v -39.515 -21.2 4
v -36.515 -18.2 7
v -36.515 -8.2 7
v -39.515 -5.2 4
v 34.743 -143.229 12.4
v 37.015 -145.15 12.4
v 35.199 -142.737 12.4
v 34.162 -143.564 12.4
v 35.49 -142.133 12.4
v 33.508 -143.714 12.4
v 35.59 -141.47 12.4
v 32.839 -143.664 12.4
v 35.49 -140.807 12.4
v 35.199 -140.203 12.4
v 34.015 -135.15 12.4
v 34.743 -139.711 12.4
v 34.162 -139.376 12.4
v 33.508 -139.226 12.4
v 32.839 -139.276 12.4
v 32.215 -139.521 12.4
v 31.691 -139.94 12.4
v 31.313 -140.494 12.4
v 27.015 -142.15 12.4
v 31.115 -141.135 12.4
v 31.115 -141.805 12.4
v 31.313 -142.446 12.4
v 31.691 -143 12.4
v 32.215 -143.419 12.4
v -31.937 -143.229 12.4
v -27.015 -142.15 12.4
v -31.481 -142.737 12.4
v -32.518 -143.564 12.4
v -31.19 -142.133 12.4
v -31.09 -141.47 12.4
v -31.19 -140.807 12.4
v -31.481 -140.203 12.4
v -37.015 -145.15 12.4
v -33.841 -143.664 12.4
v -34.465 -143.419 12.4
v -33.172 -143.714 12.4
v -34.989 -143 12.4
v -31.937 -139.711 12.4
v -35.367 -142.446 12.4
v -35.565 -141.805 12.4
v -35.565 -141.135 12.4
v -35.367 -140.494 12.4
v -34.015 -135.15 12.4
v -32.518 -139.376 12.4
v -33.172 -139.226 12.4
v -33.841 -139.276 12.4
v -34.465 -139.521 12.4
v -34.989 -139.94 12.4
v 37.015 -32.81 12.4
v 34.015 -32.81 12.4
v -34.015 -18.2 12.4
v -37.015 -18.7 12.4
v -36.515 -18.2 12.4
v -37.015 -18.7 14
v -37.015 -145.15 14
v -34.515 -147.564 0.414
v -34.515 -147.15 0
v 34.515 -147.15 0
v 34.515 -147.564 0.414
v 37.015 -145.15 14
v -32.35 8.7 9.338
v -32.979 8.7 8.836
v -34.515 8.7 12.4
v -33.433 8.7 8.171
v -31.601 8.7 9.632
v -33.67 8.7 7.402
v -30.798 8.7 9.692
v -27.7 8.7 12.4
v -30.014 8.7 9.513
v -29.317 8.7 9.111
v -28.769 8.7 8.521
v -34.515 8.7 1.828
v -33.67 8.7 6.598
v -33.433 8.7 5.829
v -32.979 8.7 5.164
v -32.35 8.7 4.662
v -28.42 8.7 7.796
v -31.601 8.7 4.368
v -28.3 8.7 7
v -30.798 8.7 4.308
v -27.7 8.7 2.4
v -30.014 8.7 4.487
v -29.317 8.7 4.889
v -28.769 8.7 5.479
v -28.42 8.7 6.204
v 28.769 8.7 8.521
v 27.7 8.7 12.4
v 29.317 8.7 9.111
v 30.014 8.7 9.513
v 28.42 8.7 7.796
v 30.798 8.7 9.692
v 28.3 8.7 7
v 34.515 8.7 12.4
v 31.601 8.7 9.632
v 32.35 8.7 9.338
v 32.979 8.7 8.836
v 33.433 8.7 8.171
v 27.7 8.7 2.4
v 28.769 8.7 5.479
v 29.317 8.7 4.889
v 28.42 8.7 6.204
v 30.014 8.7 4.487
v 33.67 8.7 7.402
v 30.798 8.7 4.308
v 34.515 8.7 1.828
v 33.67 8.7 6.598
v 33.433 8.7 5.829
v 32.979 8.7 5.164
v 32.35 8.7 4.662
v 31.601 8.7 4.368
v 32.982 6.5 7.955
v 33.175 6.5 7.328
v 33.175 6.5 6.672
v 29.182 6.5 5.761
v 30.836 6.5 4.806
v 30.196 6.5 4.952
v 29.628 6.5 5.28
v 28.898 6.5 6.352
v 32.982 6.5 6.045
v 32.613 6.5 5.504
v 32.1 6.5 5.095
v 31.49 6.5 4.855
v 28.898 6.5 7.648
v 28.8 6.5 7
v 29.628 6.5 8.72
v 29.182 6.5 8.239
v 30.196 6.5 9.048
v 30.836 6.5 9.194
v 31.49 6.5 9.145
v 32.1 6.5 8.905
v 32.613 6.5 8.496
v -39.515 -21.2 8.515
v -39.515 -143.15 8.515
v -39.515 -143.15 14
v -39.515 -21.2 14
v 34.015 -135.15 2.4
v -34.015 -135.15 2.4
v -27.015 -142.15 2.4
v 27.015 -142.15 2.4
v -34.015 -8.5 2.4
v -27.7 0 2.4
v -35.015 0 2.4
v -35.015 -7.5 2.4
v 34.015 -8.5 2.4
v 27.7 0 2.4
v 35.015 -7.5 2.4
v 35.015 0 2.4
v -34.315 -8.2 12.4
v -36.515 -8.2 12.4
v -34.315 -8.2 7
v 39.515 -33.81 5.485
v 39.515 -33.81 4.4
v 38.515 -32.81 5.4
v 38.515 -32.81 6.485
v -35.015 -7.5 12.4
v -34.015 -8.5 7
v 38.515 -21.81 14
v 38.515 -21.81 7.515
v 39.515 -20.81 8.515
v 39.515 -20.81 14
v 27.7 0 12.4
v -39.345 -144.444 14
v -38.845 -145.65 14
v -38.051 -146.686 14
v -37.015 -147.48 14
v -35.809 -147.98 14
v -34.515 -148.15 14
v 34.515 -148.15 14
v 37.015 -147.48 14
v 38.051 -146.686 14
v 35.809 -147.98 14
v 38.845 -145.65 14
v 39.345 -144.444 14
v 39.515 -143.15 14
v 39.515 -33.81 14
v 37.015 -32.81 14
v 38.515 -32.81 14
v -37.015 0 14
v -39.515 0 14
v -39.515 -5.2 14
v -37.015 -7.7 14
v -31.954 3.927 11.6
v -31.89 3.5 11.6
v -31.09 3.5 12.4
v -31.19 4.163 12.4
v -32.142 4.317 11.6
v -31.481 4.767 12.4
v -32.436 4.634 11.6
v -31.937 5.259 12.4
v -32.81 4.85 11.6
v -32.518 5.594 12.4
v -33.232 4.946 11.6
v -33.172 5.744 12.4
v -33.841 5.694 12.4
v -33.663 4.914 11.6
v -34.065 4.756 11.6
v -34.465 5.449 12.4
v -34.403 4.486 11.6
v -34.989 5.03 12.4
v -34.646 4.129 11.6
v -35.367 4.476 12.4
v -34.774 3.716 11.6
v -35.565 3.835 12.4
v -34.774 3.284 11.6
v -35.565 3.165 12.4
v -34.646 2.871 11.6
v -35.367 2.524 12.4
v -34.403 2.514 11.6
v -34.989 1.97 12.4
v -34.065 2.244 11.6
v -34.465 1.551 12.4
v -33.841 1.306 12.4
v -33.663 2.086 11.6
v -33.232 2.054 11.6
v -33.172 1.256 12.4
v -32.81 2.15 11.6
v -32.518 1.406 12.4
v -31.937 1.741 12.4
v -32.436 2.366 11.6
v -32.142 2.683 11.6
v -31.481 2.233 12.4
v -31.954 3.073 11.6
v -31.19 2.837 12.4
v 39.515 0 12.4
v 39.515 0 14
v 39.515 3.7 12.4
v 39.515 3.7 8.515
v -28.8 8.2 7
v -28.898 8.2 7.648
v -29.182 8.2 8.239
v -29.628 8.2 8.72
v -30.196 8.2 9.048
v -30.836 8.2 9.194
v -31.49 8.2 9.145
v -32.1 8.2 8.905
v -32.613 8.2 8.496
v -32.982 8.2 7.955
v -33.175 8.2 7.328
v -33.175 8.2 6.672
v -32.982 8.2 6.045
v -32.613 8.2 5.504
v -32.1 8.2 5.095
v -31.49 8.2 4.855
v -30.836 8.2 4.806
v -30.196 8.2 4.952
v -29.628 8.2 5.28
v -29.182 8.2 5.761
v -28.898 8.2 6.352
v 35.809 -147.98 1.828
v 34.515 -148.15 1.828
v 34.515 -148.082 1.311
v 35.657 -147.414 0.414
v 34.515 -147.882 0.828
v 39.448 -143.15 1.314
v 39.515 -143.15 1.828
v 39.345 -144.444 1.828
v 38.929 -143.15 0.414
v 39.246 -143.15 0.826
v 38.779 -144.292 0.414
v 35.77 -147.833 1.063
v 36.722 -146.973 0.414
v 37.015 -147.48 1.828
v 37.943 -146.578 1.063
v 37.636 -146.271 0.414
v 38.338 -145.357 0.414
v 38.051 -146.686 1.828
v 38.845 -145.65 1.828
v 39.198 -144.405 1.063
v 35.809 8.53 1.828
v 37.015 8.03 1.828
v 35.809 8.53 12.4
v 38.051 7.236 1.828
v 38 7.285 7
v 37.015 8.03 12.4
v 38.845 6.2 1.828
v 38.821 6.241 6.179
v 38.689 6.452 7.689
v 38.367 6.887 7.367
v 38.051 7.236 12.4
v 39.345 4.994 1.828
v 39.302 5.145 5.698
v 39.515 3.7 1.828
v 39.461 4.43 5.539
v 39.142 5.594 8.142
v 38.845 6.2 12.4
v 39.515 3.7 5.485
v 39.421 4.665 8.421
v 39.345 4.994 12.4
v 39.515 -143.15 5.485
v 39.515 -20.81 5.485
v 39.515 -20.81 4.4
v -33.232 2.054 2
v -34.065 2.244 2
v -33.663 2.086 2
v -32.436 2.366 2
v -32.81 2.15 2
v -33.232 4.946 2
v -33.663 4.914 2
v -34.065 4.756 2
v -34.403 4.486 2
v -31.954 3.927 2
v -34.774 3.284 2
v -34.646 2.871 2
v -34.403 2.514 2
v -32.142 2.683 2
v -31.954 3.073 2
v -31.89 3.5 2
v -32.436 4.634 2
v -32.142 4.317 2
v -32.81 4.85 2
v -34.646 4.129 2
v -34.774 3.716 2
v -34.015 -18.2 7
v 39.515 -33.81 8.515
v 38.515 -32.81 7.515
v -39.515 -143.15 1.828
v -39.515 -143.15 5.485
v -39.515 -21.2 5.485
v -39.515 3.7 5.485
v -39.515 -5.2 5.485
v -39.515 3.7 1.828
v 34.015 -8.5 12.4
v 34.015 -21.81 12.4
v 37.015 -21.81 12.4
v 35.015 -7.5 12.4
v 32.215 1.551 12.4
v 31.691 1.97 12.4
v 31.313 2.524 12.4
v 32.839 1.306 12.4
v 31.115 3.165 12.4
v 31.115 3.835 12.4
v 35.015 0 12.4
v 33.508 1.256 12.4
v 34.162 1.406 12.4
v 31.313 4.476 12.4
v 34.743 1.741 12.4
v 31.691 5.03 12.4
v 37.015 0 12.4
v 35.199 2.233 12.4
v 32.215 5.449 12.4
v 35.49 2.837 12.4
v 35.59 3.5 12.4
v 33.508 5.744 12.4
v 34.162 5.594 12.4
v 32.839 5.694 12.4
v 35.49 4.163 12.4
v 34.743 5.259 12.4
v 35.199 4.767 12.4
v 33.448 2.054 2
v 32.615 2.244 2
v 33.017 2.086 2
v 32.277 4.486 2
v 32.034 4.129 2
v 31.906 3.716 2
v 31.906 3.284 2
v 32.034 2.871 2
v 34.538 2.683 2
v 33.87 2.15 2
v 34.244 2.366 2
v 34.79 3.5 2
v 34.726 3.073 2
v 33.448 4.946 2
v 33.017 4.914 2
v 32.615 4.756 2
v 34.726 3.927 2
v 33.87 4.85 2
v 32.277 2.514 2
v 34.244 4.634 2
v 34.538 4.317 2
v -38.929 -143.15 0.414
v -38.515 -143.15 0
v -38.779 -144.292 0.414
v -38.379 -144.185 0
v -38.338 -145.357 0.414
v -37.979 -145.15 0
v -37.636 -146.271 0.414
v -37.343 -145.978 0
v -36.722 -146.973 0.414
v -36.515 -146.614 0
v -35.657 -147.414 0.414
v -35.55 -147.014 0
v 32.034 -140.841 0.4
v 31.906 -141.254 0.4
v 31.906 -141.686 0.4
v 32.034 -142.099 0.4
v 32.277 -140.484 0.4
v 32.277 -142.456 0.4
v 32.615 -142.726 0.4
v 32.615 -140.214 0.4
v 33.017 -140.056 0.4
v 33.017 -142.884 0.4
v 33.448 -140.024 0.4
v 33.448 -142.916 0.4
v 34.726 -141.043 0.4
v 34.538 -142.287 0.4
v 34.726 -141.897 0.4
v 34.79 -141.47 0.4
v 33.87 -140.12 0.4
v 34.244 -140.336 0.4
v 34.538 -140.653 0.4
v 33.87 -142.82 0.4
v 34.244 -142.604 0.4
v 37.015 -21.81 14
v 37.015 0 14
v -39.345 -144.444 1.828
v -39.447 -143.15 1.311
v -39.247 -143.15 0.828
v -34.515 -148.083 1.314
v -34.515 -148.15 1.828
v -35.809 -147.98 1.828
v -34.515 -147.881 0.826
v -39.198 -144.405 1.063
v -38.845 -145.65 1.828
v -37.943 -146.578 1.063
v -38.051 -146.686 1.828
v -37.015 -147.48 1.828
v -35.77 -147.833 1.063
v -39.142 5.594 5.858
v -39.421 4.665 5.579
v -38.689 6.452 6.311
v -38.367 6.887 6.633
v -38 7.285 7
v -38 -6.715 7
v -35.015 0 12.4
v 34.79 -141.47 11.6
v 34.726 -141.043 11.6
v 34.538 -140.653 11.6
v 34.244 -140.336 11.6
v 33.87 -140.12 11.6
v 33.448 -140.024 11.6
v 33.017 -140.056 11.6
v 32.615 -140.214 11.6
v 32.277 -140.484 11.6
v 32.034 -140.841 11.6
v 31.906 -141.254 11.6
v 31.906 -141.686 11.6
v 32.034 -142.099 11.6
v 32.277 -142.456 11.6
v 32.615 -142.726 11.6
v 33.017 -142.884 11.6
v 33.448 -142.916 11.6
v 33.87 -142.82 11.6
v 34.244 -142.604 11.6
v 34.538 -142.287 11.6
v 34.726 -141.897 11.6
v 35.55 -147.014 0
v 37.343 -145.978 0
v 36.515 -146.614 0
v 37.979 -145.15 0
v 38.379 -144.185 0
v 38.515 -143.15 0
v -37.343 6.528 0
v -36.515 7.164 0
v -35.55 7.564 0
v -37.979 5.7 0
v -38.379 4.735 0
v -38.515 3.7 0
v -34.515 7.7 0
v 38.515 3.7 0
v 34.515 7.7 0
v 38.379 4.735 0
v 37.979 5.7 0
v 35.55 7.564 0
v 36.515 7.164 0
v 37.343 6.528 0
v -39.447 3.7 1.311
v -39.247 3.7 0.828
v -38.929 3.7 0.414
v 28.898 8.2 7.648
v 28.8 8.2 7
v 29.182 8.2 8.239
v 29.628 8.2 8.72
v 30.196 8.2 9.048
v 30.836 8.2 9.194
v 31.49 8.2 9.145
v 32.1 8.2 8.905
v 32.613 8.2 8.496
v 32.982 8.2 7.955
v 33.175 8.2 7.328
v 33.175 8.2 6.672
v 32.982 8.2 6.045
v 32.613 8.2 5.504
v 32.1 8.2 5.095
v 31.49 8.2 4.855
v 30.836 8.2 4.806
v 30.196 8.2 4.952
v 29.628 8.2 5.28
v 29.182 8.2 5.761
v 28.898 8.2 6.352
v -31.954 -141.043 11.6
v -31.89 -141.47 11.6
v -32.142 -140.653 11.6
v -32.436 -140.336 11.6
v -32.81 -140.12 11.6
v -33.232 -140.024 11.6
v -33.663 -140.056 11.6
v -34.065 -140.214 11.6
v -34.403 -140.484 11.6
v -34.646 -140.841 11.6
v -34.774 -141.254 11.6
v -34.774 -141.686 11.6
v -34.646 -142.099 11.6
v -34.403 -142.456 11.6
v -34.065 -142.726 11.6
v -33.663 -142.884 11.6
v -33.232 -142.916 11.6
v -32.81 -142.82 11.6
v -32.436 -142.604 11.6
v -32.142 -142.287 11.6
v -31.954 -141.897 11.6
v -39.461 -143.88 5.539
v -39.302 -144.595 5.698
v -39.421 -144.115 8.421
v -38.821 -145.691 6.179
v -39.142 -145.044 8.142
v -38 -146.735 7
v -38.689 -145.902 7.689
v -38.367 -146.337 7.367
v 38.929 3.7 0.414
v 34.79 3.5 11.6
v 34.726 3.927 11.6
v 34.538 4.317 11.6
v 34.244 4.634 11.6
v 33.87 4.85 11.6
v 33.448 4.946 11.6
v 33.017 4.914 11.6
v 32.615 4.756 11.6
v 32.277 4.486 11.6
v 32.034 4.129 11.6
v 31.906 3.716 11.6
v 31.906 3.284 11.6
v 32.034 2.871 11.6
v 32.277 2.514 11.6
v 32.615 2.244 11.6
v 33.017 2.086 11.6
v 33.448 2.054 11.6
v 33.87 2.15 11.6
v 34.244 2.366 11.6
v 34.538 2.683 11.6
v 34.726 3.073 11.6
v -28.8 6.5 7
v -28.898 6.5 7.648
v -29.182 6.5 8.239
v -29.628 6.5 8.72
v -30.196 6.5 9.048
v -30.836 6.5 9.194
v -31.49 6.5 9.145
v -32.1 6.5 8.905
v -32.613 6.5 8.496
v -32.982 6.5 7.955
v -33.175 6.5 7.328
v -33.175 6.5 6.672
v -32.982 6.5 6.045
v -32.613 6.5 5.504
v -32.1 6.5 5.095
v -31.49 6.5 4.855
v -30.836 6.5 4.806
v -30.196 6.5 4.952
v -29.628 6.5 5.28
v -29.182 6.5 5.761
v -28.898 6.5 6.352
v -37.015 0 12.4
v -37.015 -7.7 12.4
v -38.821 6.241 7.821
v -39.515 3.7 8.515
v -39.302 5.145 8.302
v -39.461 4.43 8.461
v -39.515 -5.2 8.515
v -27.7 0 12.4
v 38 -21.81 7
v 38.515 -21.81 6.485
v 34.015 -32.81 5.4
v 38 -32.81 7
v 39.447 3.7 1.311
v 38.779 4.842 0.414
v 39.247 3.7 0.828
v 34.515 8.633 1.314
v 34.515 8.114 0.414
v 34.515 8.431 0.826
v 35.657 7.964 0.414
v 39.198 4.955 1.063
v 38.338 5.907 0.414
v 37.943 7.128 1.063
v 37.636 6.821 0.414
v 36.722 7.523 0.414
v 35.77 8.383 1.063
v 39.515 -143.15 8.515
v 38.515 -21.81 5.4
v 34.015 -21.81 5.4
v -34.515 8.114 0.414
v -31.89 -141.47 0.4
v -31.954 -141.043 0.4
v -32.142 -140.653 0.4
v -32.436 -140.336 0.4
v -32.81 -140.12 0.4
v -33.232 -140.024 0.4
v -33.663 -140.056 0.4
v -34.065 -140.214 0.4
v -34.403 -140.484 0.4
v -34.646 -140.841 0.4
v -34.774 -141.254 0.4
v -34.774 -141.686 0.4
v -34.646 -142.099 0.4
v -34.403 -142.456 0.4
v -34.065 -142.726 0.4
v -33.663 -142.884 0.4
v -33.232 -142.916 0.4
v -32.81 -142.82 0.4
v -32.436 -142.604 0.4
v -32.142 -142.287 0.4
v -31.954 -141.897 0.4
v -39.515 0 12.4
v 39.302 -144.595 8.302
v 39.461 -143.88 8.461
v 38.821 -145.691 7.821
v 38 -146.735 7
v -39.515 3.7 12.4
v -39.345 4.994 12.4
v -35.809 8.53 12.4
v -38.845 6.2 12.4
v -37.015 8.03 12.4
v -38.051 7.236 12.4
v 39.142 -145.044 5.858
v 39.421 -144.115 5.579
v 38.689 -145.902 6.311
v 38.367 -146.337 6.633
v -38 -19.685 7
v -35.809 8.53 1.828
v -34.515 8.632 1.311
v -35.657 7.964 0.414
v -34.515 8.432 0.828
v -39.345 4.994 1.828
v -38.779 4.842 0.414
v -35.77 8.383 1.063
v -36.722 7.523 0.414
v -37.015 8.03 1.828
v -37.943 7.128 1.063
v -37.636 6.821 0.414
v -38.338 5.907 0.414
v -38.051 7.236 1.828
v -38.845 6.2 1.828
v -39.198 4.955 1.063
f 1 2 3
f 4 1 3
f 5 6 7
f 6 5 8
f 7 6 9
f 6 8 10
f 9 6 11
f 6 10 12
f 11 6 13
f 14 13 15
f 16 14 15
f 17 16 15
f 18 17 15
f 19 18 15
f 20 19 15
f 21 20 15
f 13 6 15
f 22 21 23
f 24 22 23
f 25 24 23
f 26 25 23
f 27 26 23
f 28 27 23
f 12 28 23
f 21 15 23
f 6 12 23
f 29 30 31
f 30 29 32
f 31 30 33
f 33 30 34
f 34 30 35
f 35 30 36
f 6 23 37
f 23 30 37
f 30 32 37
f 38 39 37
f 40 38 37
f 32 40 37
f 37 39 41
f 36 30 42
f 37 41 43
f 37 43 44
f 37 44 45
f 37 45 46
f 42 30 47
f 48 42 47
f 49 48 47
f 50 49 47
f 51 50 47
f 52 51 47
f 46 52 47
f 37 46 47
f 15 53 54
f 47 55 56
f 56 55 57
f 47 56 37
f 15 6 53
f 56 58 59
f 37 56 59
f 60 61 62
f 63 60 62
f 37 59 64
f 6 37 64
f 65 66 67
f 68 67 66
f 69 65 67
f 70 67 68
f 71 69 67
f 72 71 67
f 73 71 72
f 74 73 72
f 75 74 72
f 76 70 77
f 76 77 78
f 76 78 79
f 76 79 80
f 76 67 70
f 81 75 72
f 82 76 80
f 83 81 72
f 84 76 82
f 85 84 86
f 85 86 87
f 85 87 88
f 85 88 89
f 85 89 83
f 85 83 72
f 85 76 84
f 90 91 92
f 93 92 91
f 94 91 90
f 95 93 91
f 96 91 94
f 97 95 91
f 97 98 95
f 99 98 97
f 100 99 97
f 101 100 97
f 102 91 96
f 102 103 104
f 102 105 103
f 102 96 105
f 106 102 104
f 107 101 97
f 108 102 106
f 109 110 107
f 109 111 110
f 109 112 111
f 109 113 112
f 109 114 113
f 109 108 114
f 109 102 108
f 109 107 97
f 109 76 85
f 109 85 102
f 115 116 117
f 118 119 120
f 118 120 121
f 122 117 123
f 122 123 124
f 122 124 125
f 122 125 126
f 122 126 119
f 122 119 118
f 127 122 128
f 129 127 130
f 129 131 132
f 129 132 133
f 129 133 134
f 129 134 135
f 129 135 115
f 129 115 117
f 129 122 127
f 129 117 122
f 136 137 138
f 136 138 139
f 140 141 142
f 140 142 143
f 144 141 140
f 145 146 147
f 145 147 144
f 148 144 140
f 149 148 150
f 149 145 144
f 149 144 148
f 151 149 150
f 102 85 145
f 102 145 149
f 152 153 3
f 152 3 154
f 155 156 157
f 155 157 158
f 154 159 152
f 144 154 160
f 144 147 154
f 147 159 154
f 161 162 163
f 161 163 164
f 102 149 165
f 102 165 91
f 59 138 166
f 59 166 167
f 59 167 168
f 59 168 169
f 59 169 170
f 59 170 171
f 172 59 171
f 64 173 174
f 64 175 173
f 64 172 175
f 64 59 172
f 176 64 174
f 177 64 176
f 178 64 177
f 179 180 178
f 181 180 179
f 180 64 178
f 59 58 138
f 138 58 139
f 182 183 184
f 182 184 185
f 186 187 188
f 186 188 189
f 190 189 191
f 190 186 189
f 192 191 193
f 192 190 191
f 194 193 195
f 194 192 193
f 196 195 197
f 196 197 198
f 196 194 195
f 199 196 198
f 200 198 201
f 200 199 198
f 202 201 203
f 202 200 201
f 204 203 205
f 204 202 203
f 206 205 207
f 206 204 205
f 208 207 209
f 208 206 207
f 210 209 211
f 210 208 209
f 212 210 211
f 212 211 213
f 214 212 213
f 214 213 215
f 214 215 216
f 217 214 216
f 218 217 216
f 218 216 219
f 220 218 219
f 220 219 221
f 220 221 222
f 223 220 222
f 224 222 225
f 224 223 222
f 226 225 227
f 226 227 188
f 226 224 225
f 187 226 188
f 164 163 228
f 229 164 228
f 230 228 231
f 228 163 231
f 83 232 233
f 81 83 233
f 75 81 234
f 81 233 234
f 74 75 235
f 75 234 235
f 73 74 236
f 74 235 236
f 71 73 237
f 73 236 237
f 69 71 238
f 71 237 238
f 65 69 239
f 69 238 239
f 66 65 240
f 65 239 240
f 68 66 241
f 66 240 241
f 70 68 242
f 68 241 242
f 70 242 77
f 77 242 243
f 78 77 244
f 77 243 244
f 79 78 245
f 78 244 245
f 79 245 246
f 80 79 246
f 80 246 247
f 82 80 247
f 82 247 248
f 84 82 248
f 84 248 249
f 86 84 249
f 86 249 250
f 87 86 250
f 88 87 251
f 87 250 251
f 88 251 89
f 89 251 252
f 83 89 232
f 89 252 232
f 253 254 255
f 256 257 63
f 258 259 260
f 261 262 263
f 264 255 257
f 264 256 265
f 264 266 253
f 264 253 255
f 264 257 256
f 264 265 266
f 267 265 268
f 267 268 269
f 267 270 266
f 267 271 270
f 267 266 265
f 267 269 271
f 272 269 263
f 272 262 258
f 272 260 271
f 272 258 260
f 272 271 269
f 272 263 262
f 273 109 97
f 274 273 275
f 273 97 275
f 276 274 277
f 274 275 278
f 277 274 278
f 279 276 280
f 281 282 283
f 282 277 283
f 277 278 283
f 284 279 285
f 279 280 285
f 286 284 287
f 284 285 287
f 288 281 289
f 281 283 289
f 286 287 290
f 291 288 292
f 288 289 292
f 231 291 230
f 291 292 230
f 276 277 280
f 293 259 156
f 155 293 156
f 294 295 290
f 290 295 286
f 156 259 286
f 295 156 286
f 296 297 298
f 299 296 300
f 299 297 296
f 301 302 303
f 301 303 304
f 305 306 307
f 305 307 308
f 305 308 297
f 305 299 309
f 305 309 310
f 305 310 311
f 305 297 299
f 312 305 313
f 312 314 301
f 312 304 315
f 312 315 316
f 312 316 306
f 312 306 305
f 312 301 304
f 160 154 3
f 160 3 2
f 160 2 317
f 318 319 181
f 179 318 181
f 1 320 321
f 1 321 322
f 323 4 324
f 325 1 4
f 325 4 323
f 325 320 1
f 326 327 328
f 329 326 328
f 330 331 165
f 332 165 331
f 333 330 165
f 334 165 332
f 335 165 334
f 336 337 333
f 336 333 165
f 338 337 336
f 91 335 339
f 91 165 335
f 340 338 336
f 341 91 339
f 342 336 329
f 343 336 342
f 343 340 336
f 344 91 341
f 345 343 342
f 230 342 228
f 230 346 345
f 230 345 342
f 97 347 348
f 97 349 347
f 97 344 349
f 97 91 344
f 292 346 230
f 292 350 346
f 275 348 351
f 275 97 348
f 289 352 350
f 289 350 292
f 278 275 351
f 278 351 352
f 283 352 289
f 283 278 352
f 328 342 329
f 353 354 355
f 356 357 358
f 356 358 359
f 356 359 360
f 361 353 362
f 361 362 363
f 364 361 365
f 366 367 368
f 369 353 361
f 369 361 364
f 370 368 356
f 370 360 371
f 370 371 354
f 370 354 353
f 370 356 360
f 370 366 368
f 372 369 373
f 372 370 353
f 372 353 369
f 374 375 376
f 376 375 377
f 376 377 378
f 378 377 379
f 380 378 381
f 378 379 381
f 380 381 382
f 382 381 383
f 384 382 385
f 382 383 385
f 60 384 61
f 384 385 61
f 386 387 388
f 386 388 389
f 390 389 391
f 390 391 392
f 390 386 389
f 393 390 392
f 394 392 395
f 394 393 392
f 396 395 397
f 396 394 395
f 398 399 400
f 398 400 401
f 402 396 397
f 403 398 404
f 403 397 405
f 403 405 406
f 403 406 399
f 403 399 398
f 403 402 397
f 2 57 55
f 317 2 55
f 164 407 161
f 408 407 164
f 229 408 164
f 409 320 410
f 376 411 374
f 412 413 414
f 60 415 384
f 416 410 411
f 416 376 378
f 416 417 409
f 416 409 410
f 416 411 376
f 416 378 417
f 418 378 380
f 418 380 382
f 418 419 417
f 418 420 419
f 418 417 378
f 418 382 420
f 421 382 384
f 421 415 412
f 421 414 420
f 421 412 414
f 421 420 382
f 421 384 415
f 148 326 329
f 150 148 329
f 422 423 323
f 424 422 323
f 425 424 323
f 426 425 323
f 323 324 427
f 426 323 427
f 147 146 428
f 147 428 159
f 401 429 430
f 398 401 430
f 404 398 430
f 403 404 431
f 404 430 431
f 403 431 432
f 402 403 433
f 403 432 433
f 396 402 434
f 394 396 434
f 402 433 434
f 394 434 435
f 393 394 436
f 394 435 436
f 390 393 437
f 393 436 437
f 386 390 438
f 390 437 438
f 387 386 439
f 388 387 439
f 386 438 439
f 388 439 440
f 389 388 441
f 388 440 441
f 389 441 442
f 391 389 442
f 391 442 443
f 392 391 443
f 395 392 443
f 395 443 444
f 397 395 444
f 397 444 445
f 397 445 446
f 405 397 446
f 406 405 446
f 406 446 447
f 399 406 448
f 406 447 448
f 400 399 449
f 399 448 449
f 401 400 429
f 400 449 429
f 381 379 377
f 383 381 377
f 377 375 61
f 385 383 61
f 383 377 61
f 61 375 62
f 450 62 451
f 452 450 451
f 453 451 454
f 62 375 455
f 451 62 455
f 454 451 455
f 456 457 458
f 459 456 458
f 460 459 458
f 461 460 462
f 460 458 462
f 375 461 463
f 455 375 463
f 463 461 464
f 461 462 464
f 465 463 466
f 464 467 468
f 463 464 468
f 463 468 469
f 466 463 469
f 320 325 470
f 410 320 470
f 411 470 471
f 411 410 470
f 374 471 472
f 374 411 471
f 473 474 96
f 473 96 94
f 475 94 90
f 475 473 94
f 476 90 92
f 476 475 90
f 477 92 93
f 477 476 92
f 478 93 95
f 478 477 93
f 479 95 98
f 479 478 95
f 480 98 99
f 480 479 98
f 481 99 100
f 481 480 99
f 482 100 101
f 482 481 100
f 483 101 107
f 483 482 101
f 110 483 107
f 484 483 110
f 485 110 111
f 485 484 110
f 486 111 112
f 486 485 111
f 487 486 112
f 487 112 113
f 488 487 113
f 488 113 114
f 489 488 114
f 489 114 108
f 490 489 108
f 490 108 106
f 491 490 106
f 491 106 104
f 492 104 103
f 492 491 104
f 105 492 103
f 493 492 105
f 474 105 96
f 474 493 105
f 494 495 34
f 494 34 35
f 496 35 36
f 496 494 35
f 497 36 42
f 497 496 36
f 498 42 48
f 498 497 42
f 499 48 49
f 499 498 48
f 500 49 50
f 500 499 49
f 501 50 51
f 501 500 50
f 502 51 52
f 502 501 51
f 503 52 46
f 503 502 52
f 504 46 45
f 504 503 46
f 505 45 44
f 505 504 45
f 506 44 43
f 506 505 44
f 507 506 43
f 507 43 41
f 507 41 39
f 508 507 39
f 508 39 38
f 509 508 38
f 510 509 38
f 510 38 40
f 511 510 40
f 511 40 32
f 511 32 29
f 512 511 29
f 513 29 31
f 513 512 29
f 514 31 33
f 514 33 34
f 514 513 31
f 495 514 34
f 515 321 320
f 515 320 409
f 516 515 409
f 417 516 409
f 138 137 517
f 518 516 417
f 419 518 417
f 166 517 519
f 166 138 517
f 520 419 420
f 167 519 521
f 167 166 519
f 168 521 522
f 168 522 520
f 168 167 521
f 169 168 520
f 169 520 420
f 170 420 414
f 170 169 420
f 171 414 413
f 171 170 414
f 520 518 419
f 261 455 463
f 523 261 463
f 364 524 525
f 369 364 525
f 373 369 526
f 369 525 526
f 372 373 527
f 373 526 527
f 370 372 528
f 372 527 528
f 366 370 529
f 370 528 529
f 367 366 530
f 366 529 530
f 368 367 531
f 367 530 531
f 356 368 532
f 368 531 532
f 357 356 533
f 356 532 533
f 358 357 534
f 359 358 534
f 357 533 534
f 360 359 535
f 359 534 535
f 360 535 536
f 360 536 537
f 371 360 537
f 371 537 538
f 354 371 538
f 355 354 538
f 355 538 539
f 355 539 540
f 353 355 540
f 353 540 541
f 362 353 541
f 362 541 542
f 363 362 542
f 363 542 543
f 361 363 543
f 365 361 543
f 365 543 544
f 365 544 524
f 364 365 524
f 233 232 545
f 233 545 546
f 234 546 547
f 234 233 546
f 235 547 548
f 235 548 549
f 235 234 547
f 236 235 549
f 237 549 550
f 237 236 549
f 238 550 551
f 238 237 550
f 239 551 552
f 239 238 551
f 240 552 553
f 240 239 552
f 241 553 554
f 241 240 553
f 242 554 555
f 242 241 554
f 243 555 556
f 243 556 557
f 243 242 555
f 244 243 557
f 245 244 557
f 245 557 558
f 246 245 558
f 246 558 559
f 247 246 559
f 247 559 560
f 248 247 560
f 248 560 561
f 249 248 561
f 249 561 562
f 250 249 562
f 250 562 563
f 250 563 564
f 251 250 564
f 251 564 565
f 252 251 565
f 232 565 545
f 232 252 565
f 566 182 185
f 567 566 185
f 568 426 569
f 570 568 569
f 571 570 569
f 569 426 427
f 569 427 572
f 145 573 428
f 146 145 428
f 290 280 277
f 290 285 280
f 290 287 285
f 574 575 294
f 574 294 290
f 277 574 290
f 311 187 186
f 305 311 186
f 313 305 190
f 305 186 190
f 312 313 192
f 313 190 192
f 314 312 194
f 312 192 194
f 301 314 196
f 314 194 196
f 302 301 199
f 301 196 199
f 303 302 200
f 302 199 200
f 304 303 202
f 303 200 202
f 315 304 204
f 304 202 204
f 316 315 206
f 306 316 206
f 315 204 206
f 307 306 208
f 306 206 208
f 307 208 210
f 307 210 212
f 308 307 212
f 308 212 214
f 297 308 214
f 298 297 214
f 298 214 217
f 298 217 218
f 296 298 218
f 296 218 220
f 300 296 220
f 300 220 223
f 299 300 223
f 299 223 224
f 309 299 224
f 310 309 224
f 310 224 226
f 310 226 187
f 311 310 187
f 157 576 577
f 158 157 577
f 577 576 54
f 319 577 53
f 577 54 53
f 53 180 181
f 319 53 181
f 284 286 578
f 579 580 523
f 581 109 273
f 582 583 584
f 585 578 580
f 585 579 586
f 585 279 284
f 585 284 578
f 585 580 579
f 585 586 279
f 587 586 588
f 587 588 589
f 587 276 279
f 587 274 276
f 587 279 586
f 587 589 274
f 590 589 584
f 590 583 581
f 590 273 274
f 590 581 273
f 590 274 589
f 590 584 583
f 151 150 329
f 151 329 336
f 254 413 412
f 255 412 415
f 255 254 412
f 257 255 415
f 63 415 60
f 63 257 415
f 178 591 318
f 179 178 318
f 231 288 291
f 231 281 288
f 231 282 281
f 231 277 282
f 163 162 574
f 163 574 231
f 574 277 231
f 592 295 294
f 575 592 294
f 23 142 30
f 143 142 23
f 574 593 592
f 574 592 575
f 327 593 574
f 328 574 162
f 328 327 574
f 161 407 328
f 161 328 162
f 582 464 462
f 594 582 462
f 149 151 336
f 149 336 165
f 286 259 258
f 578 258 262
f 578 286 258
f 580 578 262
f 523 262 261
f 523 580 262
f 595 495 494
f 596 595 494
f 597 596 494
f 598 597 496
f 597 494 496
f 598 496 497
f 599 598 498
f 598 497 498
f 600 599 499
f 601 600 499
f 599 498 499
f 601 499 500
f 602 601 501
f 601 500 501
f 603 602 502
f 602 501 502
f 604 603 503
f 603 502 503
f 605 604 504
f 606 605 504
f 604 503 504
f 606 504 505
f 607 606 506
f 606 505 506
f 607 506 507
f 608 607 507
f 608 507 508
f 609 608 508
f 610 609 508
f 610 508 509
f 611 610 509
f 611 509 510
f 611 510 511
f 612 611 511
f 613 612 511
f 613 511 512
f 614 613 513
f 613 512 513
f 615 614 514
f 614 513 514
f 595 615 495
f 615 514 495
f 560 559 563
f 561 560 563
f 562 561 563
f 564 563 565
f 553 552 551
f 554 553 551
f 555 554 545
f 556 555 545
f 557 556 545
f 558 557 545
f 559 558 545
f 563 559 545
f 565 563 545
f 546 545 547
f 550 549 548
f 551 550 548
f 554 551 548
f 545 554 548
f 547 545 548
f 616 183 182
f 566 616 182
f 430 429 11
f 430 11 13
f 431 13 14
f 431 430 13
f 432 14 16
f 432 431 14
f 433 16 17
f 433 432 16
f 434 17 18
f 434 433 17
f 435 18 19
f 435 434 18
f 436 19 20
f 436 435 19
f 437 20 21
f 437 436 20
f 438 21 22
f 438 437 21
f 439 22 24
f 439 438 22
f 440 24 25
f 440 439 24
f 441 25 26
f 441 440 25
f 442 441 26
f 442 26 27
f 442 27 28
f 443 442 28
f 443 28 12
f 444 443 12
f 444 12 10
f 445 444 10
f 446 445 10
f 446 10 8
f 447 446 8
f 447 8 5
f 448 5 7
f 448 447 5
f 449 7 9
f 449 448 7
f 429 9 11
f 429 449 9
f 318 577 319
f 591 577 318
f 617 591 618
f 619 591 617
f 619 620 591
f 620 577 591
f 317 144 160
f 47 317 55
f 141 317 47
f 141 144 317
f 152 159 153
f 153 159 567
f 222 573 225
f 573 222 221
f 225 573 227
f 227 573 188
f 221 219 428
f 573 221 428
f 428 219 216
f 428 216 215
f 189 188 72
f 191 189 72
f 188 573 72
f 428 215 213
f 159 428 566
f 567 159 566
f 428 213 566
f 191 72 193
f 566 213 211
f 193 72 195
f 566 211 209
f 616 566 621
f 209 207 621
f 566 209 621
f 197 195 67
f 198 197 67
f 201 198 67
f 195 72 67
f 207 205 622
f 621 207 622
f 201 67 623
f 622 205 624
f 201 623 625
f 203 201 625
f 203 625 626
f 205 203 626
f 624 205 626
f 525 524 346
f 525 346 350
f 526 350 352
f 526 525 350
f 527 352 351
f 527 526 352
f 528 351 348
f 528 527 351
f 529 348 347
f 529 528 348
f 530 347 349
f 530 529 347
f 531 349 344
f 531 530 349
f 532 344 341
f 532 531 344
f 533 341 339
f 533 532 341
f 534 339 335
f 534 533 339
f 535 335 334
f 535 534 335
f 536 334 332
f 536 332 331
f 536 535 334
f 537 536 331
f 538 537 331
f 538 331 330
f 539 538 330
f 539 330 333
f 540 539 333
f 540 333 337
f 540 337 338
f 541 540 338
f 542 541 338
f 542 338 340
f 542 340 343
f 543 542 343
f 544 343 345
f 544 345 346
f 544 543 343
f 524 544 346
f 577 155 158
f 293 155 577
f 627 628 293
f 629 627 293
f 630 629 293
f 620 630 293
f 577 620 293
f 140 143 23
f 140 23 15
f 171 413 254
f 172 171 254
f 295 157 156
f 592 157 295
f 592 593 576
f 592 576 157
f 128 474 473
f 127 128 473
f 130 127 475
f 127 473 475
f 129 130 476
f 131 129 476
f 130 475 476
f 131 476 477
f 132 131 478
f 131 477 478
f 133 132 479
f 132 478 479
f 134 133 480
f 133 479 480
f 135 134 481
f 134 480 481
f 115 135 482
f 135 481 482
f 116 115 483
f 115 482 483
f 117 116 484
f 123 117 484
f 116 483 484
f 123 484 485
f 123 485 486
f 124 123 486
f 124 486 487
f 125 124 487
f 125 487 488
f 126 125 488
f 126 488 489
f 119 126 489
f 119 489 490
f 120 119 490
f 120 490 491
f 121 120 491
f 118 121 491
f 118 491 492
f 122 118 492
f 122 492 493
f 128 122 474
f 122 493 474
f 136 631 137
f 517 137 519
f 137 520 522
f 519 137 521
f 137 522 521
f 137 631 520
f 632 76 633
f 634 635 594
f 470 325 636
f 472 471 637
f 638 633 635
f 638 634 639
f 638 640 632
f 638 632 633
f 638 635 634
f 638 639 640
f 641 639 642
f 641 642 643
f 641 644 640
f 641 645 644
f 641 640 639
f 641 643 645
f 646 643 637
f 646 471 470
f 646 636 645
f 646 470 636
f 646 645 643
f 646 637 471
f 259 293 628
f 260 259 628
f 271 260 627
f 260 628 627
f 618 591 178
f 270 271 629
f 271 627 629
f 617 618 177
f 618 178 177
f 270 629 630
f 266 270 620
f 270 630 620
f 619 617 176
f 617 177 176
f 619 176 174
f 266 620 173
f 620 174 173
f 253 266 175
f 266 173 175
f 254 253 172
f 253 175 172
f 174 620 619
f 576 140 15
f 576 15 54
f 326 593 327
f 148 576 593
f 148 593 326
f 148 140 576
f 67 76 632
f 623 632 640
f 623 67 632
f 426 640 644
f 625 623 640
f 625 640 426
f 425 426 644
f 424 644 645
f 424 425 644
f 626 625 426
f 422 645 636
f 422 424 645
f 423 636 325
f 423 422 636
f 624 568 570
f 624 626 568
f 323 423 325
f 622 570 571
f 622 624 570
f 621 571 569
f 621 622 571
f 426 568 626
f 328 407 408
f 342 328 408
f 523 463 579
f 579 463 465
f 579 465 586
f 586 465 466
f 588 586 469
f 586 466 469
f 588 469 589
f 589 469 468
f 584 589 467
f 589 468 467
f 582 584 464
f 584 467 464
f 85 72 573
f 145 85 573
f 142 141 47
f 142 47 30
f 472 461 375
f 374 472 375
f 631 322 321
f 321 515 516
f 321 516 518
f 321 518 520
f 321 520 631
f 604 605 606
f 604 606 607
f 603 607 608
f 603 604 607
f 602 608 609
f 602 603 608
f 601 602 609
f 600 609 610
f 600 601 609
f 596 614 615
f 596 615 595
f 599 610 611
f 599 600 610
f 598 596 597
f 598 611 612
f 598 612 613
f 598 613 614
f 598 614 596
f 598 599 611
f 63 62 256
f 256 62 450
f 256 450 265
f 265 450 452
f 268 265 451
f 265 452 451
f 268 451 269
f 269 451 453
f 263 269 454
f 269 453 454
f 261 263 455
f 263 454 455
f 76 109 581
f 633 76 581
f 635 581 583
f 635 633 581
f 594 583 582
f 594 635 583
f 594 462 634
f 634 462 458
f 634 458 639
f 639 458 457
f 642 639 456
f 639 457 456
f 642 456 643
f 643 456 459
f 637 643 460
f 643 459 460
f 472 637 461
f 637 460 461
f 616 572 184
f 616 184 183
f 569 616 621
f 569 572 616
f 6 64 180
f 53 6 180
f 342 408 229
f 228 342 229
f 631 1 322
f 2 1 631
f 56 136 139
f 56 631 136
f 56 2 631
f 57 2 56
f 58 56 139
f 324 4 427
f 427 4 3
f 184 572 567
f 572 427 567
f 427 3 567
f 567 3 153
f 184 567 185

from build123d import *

# Parameters (mm, degrees)
SKETCH_W        = 79.03
SKETCH_H        = 156.85
PAD_DEPTH       = 14
POCKET_DEPTH    = 11.6
PAD001_DEPTH    = 10
SKETCH003_R     = 1.45
POCKET001_DEPTH = 12
FILLET_R        = 5
CHAMFER_SIZE    = 1
FILLET001_R     = 2
CHAMFER001_SIZE = 0.8
SKETCH004_W     = 12.65
SKETCH004_H     = 11
POCKET002_DEPTH = 8.6
SKETCH005_W     = 11.08
SKETCH005_H     = 10
POCKET003_DEPTH = 7
SKETCH006_R     = 1.45
POCKET004_DEPTH = 12
SKETCH007_W     = 92.15
SKETCH007_H     = 16.7
POCKET005_DEPTH = 1.6
CHAMFER002_SIZE = 0.8
CHAMFER003_SIZE = 3
CHAMFER004_SIZE = 1
POCKET006_DEPTH = 509.235242
SKETCH009_R     = 2.2
POCKET007_DEPTH = 2.2
CHAMFER005_SIZE = 0.5


with BuildPart() as part:
    # Sketch → Pad (new body)
    with BuildSketch(Plane.XY):
        with Locations((0, -69.725)):
            Rectangle(SKETCH_W, SKETCH_H)
    extrude(amount=PAD_DEPTH)

    # Sketch001 (on Face6 of Pad) → Pocket (cut)
    with BuildSketch(Plane.XY.offset(14)):
        Polygon((-37.015, -145.15), (37.015, -145.15), (37.015, 0), (27.7, 0), (27.7, 8.7), (-27.7, 8.7), (-27.7, 0), (-37.015, 0), align=None)
    extrude(amount=-POCKET_DEPTH, mode=Mode.SUBTRACT)

    # Sketch002 (on Face6 of Pocket) → Pad001 (join)
    with BuildSketch(Plane.XY.offset(2.4)):
        Polygon((-35.015, 0), (-35.015, -7.5), (-34.015, -8.5), (-34.015, -135.15), (-27.015, -142.15), (27.015, -142.15), (34.015, -135.15), (34.015, -8.5), (35.015, -7.5), (35.015, 0), (37.015, 0), (37.015, -145.15), (-37.015, -145.15), (-37.015, 0), align=None)
    extrude(amount=PAD001_DEPTH)

    # Sketch003 (on Face24 of Pad001) → Pocket001 (cut)
    with BuildSketch(Plane.XY.offset(12.4)):
        with Locations((-33.34, -141.47)):
            Circle(SKETCH003_R)
        with Locations((33.34, -141.47)):
            Circle(SKETCH003_R)
    extrude(amount=-POCKET001_DEPTH, mode=Mode.SUBTRACT)

    # Fillet
    fillet_edges = [part.edges().sort_by_distance(p)[0] for p in [
        (39.515, 8.7, 7),
        (39.515, -148.15, 7),
        (-39.515, 8.7, 7),
        (-39.515, -148.15, 7),
    ]]
    fillet(fillet_edges, radius=FILLET_R)

    # Chamfer
    chamfer_edges = [part.edges().sort_by_distance(p)[0] for p in [
        (-38.050534, 7.235534, 0),
    ]]
    chamfer(chamfer_edges, length=CHAMFER_SIZE)

    # Fillet001
    fillet001_edges = [part.edges().sort_by_distance(p)[0] for p in [
        (-38.050534, 7.235534, 1),
    ]]
    fillet(fillet001_edges, radius=FILLET001_R)

    # Chamfer001
    chamfer001_edges = [part.edges().sort_by_distance(p)[0] for p in [
        (-34.79, -141.47, 12.4),
        (31.89, -141.47, 12.4),
    ]]
    chamfer(chamfer001_edges, length=CHAMFER001_SIZE)

    # Sketch004 (on Face20 of Chamfer001) → Pocket002 (cut)
    with BuildSketch(Plane.XY.offset(14)):
        with Locations((37.485, -27.31)):
            Rectangle(SKETCH004_W, SKETCH004_H)
    extrude(amount=-POCKET002_DEPTH, mode=Mode.SUBTRACT)

    # Sketch005 (on Face16 of Pocket002) → Pocket003 (cut)
    with BuildSketch(Plane.XY.offset(14)):
        with Locations((-36.33, -13.2)):
            Rectangle(SKETCH005_W, SKETCH005_H)
    extrude(amount=-POCKET003_DEPTH, mode=Mode.SUBTRACT)

    # Sketch006 → Pocket004 (cut)
    with BuildSketch(Plane.XY.offset(14)):
        with Locations((-33.34, 3.5)):
            Circle(SKETCH006_R)
        with Locations((33.34, 3.5)):
            Circle(SKETCH006_R)
    extrude(amount=-POCKET004_DEPTH, mode=Mode.SUBTRACT)

    # Sketch007 (on Face7 of Pocket004) → Pocket005 (cut)
    with BuildSketch(Plane.XY.offset(14)):
        with Locations((0, 8.35)):
            Rectangle(SKETCH007_W, SKETCH007_H)
    extrude(amount=-POCKET005_DEPTH, mode=Mode.SUBTRACT)

    # Chamfer002
    chamfer002_edges = [part.edges().sort_by_distance(p)[0] for p in [
        (31.89, 3.5, 12.4),
        (-34.79, 3.5, 12.4),
    ]]
    chamfer(chamfer002_edges, length=CHAMFER002_SIZE)

    # Chamfer003
    chamfer003_edges = [part.edges().sort_by_distance(p)[0] for p in [
        (-39.515, -8.2, 10.5),
        (-39.515, -13.2, 7),
        (-39.515, -18.2, 10.5),
    ]]
    chamfer(chamfer003_edges, length=CHAMFER003_SIZE)

    # Chamfer004
    chamfer004_edges = [part.edges().sort_by_distance(p)[0] for p in [
        (39.515, -21.81, 9.7),
        (39.515, -27.31, 5.4),
        (39.515, -32.81, 9.7),
    ]]
    chamfer(chamfer004_edges, length=CHAMFER004_SIZE)

    # Sketch008 (on Face9 of Chamfer004) → Pocket006 (cut, through all)
    with BuildSketch(Plane.XZ.offset(148.15)):
        Polygon((-43, 12), (-43, 2), (-38, 7), align=None)
    pocket006 = extrude(amount=-POCKET006_DEPTH, mode=Mode.SUBTRACT)

    # Mirrored: Pocket006 across Sketch008 V_Axis
    add(pocket006.mirror(Plane(origin=(0, -148.15, 0), x_dir=(0, -1, 0), z_dir=(1, 0, 0))), mode=Mode.SUBTRACT)

    # Sketch009 (on Face56 of Mirrored) → Pocket007 (cut)
    with BuildSketch(Plane(origin=(0, 8.7, 0), x_dir=(-1, 0, 0), z_dir=(0, 1, 0))):
        with Locations((-31, 7)):
            Circle(SKETCH009_R)
    pocket007 = extrude(amount=-POCKET007_DEPTH, mode=Mode.SUBTRACT)

    # Mirrored001: Pocket007 across Sketch009 V_Axis
    add(pocket007.mirror(Plane(origin=(0, 8.7, 0), x_dir=(0, 1, 0), z_dir=(-1, 0, 0))), mode=Mode.SUBTRACT)

    # Chamfer005
    chamfer005_edges = [part.edges().sort_by_distance(p)[0] for p in [
        (33.2, 8.7, 7),
        (-33.2, 8.7, 7),
    ]]
    chamfer(chamfer005_edges, length=CHAMFER005_SIZE)


solid = part.part
